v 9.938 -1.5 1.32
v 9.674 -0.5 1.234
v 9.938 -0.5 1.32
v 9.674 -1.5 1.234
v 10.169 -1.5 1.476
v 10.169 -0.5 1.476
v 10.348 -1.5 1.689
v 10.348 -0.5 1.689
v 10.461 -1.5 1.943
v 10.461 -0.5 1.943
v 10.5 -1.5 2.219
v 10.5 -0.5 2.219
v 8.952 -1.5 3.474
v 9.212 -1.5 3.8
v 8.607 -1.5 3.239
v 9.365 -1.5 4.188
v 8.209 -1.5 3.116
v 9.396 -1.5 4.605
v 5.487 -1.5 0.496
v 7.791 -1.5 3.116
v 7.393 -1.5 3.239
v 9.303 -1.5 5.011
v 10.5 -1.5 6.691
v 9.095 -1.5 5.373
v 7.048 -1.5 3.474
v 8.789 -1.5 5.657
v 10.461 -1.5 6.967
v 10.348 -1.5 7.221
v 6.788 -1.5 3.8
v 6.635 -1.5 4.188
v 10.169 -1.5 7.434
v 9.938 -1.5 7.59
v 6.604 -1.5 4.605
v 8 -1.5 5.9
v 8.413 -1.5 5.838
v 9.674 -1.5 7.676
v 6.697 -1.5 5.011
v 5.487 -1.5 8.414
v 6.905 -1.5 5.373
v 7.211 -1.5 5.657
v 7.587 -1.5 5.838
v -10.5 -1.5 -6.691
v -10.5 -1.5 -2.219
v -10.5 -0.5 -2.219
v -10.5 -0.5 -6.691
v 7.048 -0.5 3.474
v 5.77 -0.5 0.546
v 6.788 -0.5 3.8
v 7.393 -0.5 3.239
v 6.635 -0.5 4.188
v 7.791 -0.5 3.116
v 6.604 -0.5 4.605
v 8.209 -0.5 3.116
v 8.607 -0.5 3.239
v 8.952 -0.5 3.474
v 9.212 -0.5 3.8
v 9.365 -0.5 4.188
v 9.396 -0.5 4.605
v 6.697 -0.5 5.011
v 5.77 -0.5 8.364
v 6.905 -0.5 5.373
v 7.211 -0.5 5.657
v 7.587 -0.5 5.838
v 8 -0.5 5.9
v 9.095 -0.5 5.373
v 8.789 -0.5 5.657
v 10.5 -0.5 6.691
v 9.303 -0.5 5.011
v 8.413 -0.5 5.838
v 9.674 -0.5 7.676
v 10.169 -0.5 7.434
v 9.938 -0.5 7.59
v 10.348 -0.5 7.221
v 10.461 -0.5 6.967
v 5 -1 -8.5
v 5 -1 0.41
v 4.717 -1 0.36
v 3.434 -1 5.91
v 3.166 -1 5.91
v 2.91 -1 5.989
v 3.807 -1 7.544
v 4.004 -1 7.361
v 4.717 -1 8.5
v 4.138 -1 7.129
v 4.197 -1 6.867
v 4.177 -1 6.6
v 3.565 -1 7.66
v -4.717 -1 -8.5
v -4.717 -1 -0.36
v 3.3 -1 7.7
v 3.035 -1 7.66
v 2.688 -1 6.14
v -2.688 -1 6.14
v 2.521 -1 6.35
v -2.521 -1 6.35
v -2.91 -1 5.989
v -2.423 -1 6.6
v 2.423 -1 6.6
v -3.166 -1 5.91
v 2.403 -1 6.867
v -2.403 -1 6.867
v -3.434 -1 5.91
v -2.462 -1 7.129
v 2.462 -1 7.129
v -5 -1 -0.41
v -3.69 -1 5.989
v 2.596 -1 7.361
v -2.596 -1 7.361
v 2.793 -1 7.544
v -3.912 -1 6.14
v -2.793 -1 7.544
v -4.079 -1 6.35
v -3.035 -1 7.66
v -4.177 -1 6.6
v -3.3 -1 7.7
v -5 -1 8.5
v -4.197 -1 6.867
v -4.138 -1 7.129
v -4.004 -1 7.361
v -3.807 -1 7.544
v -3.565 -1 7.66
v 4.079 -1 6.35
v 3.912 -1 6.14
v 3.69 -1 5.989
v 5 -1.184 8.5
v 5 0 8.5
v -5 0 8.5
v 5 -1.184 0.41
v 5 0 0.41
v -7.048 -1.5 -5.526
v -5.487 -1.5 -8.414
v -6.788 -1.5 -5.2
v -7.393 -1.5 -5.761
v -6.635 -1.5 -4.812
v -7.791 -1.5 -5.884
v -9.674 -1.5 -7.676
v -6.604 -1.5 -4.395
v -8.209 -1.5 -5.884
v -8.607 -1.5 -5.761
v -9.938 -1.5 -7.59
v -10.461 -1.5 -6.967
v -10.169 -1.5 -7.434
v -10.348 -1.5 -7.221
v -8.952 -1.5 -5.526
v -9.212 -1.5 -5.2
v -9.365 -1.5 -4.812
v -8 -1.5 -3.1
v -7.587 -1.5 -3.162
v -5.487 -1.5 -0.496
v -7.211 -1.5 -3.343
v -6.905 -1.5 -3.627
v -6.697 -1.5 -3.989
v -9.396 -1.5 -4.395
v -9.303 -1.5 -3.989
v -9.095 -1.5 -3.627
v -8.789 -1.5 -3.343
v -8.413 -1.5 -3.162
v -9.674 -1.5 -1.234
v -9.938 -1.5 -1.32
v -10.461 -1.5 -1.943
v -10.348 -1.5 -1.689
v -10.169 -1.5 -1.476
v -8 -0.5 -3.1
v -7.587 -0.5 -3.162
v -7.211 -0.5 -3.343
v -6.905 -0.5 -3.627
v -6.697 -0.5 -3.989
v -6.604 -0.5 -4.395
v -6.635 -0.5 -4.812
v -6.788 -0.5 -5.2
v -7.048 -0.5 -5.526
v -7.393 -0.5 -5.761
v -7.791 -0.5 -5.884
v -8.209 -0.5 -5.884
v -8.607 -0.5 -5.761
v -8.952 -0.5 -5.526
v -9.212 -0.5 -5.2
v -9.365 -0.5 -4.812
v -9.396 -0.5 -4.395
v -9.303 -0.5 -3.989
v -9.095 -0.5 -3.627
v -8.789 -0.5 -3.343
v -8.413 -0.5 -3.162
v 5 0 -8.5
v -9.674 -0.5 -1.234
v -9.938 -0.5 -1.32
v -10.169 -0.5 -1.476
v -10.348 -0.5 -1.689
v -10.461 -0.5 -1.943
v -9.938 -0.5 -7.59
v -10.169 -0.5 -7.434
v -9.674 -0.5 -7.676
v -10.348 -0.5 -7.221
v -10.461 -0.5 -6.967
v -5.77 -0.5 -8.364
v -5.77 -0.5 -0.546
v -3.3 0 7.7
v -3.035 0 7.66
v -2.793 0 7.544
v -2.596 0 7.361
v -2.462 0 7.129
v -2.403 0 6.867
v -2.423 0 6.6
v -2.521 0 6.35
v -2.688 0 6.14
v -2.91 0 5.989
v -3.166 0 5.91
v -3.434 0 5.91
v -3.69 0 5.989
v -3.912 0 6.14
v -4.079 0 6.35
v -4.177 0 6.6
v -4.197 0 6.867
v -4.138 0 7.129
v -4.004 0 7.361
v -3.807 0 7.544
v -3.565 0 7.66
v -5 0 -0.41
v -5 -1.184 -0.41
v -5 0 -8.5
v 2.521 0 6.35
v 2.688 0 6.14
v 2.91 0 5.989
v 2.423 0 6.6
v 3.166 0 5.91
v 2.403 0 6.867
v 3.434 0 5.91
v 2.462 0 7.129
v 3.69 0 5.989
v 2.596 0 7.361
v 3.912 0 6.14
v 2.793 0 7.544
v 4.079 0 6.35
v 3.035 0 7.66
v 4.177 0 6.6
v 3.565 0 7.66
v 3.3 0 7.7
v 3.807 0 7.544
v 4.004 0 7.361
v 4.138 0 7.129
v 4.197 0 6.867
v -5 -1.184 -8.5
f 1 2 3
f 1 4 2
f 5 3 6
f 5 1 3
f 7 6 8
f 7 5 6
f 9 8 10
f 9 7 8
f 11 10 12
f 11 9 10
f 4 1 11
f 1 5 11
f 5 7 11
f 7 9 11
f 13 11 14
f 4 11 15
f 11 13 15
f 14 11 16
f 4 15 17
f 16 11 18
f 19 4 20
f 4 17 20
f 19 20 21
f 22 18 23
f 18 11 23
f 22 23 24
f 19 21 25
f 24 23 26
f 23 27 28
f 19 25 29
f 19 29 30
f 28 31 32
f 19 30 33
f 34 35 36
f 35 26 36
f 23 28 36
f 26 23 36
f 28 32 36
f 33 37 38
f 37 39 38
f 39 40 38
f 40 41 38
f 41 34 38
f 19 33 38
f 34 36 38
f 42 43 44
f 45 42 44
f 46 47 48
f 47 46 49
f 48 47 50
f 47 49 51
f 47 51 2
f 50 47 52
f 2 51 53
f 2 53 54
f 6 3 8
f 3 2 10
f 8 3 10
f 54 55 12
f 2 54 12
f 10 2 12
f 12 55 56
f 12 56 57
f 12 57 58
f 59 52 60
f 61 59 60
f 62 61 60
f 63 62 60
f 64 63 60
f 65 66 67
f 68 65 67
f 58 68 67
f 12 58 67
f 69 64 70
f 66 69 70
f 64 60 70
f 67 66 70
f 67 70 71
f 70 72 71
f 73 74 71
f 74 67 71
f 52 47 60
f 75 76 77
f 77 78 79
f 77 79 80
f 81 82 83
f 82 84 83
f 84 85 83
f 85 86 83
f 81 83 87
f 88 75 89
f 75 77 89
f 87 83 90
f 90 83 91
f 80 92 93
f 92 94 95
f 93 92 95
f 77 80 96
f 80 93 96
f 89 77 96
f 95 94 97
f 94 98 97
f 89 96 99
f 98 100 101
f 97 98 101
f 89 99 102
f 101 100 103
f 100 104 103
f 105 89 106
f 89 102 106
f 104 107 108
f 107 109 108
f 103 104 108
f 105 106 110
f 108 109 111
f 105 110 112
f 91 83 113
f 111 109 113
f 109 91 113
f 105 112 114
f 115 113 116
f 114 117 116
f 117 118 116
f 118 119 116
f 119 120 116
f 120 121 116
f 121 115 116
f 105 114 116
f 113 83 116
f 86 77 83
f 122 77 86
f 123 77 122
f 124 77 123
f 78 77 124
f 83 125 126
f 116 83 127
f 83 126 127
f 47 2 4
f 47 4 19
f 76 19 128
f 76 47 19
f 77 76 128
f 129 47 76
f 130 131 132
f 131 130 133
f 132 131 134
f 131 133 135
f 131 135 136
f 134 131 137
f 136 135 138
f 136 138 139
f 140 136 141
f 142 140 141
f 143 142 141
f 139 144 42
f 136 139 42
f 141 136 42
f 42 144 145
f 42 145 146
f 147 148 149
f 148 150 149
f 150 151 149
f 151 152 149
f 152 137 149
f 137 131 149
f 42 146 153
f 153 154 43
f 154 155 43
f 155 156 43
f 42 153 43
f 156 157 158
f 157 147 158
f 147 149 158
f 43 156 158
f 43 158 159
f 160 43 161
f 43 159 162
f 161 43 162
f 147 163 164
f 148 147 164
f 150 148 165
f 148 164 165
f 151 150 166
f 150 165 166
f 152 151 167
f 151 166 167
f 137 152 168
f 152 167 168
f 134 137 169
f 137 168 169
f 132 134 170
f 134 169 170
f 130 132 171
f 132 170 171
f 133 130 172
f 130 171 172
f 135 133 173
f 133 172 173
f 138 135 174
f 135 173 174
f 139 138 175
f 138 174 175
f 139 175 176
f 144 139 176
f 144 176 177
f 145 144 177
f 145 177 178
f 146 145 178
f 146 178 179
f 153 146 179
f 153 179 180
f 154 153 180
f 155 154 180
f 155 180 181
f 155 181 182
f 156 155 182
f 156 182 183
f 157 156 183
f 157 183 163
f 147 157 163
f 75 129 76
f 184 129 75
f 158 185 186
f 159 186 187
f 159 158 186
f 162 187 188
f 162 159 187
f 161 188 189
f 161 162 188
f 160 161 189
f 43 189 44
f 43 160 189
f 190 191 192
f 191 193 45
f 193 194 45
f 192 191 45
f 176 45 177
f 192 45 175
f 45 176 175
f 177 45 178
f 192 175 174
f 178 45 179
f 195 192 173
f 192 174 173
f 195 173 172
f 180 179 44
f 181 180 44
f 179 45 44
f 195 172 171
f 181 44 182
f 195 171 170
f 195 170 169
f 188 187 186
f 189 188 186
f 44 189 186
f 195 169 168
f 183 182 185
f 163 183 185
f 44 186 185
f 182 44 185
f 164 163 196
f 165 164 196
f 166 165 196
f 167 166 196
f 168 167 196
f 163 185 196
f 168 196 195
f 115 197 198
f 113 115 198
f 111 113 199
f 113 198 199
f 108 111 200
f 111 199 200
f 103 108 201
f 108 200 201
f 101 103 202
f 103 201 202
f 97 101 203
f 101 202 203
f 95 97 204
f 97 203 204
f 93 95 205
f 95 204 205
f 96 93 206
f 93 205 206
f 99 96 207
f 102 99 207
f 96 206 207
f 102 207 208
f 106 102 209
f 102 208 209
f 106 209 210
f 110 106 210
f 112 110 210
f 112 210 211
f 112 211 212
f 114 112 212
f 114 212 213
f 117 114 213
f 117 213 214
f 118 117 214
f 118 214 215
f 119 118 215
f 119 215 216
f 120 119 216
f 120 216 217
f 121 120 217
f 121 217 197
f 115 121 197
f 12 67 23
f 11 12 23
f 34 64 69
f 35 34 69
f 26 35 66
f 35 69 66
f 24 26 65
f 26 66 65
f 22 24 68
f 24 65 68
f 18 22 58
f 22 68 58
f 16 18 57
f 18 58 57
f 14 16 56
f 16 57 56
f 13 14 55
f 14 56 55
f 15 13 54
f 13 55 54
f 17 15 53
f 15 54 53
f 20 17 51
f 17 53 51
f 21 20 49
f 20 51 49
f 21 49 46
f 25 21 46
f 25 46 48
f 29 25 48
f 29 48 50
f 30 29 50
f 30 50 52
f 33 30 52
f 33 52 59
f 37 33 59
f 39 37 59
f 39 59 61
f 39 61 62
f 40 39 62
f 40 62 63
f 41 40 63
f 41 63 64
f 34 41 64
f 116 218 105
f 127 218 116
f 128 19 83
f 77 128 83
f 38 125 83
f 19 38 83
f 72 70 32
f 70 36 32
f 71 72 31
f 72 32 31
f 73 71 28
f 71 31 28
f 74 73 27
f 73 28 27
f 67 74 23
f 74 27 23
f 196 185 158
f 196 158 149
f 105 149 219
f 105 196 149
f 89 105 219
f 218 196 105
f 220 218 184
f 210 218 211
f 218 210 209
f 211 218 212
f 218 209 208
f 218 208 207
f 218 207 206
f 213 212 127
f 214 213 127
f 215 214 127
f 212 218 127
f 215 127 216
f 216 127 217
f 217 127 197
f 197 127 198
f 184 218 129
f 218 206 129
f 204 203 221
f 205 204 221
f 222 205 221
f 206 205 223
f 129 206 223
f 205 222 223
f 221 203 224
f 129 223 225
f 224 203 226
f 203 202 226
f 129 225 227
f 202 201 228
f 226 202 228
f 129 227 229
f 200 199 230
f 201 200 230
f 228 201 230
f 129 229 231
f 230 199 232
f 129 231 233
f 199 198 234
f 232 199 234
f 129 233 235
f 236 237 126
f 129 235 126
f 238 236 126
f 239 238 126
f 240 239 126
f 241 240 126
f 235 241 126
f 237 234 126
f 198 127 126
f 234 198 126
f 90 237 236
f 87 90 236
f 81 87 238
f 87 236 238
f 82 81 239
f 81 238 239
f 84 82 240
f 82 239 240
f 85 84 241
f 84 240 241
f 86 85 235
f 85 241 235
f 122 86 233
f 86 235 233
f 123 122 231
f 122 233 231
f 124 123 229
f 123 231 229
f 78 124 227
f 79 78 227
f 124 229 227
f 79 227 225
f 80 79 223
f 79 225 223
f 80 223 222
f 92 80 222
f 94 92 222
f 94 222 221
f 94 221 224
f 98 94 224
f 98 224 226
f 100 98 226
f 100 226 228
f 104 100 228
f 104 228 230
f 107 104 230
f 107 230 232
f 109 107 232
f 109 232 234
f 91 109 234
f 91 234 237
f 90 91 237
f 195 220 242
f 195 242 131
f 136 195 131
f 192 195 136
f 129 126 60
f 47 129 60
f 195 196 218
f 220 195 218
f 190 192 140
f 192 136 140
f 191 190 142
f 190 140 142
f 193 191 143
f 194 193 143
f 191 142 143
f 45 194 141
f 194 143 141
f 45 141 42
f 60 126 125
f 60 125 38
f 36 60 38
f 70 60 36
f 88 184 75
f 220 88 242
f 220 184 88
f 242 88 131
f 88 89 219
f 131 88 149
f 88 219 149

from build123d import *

# Parameters (mm, degrees)
BOSS_EXTRUDE1_DEPTH = 8.5
SKETCH2_R           = 0.9
SKETCH2_R_2         = 1.4
CUT_EXTRUDE1_DEPTH  = 14.592277219
CUT_EXTRUDE2_DEPTH  = 14.592277219
CUT_EXTRUDE3_REACH  = 22.037
CUT_EXTRUDE4_REACH  = 22.037
FILLET1_R           = 1


with BuildPart() as part:
    # Sketch1 → Boss-Extrude1 (new, symmetric)
    with BuildSketch(Plane.XY):
        Polygon((-5, 0), (5, 0), (5.769932482, -0.5), (10.5, -0.5), (10.5, -1.5), (5.487, -1.5), (4.717067518, -1), (-4.717067518, -1), (-5.487, -1.5), (-10.5, -1.5), (-10.5, -0.5), (-5.769932482, -0.5), align=None)
    extrude(amount=BOSS_EXTRUDE1_DEPTH, both=True)

    # Sketch2 → Cut-Extrude1 (cut, through all)
    with BuildSketch(Plane(origin=(0, 0, 0), x_dir=(1, 0, 0), z_dir=(0, 1, 0))):
        with Locations(Location((-3.3, -6.8, 0), (0, 0, 270))):
            Circle(SKETCH2_R)
        with Locations(Location((3.3, -6.8, 0), (0, 0, 270))):
            Circle(SKETCH2_R)
        with Locations(Location((8, -4.5, 0), (0, 0, 270))):
            Circle(SKETCH2_R_2)
        with Locations(Location((-8, 4.5, 0), (0, 0, 270))):
            Circle(SKETCH2_R_2)
    extrude(amount=-CUT_EXTRUDE1_DEPTH, mode=Mode.SUBTRACT)

    # Sketch3 → Cut-Extrude2 (cut, through all)
    with BuildSketch(Plane(origin=(0, 0, 0), x_dir=(1, 0, 0), z_dir=(0, 1, 0))):
        Polygon((5, -8.5), (10.5, -7.530201606), (10.5, -8.5), align=None)
        Polygon((10.5, -1.38), (5, -0.410201606), (5, 8.5), (10.5, 8.5), align=None)
        Polygon((-10.5, 8.5), (-5, 8.5), (-10.5, 7.530201606), align=None)
        Polygon((-10.5, 1.38), (-5, 0.410201606), (-5, -8.5), (-10.5, -8.5), align=None)
    extrude(amount=-CUT_EXTRUDE2_DEPTH, mode=Mode.SUBTRACT)

    # Cut-Extrude3: up to this face of the body (flat: up to its plane)
    cut_extrude3_end = Plane(part.part.faces().sort_by_distance((-7.700021392, -0.971737286, -0.886288226))[0])
    # Sketch4 → Cut-Extrude3 (cut, up to the picked face)
    with BuildSketch(Plane.XY.offset(8.5), mode=Mode.PRIVATE) as cut_extrude3_sk1:
        Polygon((-5, -1.183738502), (-4.717067518, -1), (-5, -1), align=None)
    cut_extrude3_tool1 = split(extrude(cut_extrude3_sk1.sketch, amount=-CUT_EXTRUDE3_REACH, mode=Mode.PRIVATE), bisect_by=cut_extrude3_end, keep=Keep.BOTH, mode=Mode.PRIVATE)
    add(cut_extrude3_tool1.solids().sort_by(Axis((-4.905689, -1.061246, 8.5), (0, 0, -1)))[0], mode=Mode.SUBTRACT)

    # Cut-Extrude4: up to this face of the body (flat: up to its plane)
    cut_extrude4_end = Plane(part.part.faces().sort_by_distance((7.700021392, -0.971737286, 0.886288226))[0])
    # Sketch5 → Cut-Extrude4 (cut, up to the picked face)
    with BuildSketch(Plane(origin=(0, 0, -8.5), x_dir=(-1, 0, 0), z_dir=(0, 0, -1)), mode=Mode.PRIVATE) as cut_extrude4_sk1:
        Polygon((-5, -1.183738502), (-4.717067518, -1), (-5, -1), align=None)
    cut_extrude4_tool1 = split(extrude(cut_extrude4_sk1.sketch, amount=-CUT_EXTRUDE4_REACH, mode=Mode.PRIVATE), bisect_by=cut_extrude4_end, keep=Keep.BOTH, mode=Mode.PRIVATE)
    add(cut_extrude4_tool1.solids().sort_by(Axis((4.905689, -1.061246, -8.5), (0, 0, 1)))[0], mode=Mode.SUBTRACT)

    # Fillet1
    fillet1_edges = [part.edges().sort_by_distance(p)[0] for p in [
        (-10.5, -1, -1.38),
        (10.5, -1, 7.530201606),
        (10.5, -1, 1.38),
        (-10.5, -1, -7.530201606),
    ]]
    fillet(fillet1_edges, radius=FILLET1_R)


solid = part.part
